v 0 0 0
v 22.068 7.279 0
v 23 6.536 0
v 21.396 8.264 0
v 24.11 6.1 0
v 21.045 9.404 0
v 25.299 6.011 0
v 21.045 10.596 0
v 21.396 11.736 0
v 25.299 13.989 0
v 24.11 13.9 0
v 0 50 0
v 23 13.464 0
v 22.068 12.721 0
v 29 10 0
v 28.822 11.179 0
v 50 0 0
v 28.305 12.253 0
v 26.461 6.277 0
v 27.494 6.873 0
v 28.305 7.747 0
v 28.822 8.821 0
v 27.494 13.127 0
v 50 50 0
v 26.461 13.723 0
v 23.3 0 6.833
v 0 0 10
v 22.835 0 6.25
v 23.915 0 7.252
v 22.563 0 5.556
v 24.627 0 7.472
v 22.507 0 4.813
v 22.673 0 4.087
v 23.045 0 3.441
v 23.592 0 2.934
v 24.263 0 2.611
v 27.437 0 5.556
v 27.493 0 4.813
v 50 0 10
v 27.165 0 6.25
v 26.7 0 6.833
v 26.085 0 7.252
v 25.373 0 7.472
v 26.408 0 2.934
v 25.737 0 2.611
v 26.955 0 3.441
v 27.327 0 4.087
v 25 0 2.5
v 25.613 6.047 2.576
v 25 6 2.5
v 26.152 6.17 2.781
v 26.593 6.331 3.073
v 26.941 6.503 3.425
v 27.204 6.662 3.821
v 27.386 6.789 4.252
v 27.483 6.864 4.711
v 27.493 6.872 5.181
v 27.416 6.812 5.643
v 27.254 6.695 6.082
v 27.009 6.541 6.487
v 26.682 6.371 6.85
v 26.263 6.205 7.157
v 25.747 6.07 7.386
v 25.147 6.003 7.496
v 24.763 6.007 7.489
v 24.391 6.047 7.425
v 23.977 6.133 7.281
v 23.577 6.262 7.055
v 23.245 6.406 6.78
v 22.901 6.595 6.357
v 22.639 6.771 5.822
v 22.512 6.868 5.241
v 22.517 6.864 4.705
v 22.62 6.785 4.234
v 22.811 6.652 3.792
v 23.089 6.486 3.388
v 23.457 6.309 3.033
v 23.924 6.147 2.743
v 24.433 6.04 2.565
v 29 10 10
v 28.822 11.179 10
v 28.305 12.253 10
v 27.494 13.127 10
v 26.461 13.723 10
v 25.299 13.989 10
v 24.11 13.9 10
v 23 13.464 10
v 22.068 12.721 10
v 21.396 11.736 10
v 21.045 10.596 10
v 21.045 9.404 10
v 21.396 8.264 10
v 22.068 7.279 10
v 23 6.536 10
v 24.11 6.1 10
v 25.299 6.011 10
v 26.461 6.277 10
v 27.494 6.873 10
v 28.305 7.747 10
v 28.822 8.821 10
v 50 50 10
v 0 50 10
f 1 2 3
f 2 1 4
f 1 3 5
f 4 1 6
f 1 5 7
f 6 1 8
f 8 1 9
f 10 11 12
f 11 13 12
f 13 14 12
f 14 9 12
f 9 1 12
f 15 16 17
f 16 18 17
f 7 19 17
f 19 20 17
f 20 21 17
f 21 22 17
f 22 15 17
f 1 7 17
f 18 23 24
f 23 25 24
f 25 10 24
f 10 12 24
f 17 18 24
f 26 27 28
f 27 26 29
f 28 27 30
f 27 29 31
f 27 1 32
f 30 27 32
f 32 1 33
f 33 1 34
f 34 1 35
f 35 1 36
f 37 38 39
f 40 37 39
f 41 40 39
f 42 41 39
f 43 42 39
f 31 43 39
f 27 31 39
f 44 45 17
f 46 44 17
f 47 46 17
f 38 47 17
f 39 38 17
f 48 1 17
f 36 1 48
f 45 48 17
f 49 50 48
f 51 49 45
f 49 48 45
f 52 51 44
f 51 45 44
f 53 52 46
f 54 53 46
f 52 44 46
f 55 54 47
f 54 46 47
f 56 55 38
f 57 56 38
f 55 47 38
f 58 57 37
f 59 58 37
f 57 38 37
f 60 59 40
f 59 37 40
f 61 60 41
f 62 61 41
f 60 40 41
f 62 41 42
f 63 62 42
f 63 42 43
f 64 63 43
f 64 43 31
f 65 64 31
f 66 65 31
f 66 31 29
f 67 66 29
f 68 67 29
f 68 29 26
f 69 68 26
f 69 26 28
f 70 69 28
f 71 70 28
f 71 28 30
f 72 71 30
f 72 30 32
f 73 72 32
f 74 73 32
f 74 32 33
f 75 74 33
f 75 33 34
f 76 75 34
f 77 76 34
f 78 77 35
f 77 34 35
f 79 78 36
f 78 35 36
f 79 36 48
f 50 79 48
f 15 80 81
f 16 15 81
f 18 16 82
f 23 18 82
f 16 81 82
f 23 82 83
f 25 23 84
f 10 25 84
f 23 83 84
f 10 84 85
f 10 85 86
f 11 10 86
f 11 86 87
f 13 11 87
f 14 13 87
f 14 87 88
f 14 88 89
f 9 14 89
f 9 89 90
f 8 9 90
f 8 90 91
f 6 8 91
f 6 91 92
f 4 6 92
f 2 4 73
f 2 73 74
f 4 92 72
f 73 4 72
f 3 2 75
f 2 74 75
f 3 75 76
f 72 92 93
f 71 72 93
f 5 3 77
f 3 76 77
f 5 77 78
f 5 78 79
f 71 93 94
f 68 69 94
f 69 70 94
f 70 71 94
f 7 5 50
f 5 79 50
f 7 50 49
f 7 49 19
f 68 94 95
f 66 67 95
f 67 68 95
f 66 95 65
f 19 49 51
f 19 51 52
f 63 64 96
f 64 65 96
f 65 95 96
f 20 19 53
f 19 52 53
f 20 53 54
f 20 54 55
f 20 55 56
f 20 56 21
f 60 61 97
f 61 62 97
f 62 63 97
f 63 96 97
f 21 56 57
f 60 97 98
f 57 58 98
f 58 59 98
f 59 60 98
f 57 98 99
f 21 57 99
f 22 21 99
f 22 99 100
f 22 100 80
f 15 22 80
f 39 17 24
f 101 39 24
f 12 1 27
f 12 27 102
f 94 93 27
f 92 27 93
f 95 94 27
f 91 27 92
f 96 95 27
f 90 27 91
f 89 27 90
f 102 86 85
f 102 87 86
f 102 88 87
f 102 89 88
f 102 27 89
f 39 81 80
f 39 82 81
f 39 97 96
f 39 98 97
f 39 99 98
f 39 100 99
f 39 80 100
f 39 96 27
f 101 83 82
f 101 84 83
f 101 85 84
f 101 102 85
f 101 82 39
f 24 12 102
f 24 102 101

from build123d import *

# Parameters (mm, degrees)
SKETCH_1_W          = 50
SKETCH_1_H          = 50
EXTRUDE_1_DEPTH     = 10
SKETCH_2_R          = 4
CUT_EXTRUDE_1_DEPTH = 10
SKETCH_3_R          = 2.5
CUT_EXTRUDE_2_DEPTH = 10


with BuildPart() as part:
    # Эскиз1 → Бобышка-Вытянуть1 (new body)
    with BuildSketch(Plane.XY):
        with Locations((25, 25)):
            Rectangle(SKETCH_1_W, SKETCH_1_H)
    extrude(amount=EXTRUDE_1_DEPTH)

    # Эскиз2 → Вырез-Вытянуть1 (cut)
    with BuildSketch(Plane.XY.offset(10)):
        with Locations((25, 10)):
            Circle(SKETCH_2_R)
    extrude(amount=-CUT_EXTRUDE_1_DEPTH, mode=Mode.SUBTRACT)

    # Эскиз3 → Вырез-Вытянуть2 (cut)
    with BuildSketch(Plane.XZ):
        with Locations(Location((25, 5, 0), (0, 0, 270))):
            Circle(SKETCH_3_R)
    extrude(amount=-CUT_EXTRUDE_2_DEPTH, mode=Mode.SUBTRACT)


solid = part.part
